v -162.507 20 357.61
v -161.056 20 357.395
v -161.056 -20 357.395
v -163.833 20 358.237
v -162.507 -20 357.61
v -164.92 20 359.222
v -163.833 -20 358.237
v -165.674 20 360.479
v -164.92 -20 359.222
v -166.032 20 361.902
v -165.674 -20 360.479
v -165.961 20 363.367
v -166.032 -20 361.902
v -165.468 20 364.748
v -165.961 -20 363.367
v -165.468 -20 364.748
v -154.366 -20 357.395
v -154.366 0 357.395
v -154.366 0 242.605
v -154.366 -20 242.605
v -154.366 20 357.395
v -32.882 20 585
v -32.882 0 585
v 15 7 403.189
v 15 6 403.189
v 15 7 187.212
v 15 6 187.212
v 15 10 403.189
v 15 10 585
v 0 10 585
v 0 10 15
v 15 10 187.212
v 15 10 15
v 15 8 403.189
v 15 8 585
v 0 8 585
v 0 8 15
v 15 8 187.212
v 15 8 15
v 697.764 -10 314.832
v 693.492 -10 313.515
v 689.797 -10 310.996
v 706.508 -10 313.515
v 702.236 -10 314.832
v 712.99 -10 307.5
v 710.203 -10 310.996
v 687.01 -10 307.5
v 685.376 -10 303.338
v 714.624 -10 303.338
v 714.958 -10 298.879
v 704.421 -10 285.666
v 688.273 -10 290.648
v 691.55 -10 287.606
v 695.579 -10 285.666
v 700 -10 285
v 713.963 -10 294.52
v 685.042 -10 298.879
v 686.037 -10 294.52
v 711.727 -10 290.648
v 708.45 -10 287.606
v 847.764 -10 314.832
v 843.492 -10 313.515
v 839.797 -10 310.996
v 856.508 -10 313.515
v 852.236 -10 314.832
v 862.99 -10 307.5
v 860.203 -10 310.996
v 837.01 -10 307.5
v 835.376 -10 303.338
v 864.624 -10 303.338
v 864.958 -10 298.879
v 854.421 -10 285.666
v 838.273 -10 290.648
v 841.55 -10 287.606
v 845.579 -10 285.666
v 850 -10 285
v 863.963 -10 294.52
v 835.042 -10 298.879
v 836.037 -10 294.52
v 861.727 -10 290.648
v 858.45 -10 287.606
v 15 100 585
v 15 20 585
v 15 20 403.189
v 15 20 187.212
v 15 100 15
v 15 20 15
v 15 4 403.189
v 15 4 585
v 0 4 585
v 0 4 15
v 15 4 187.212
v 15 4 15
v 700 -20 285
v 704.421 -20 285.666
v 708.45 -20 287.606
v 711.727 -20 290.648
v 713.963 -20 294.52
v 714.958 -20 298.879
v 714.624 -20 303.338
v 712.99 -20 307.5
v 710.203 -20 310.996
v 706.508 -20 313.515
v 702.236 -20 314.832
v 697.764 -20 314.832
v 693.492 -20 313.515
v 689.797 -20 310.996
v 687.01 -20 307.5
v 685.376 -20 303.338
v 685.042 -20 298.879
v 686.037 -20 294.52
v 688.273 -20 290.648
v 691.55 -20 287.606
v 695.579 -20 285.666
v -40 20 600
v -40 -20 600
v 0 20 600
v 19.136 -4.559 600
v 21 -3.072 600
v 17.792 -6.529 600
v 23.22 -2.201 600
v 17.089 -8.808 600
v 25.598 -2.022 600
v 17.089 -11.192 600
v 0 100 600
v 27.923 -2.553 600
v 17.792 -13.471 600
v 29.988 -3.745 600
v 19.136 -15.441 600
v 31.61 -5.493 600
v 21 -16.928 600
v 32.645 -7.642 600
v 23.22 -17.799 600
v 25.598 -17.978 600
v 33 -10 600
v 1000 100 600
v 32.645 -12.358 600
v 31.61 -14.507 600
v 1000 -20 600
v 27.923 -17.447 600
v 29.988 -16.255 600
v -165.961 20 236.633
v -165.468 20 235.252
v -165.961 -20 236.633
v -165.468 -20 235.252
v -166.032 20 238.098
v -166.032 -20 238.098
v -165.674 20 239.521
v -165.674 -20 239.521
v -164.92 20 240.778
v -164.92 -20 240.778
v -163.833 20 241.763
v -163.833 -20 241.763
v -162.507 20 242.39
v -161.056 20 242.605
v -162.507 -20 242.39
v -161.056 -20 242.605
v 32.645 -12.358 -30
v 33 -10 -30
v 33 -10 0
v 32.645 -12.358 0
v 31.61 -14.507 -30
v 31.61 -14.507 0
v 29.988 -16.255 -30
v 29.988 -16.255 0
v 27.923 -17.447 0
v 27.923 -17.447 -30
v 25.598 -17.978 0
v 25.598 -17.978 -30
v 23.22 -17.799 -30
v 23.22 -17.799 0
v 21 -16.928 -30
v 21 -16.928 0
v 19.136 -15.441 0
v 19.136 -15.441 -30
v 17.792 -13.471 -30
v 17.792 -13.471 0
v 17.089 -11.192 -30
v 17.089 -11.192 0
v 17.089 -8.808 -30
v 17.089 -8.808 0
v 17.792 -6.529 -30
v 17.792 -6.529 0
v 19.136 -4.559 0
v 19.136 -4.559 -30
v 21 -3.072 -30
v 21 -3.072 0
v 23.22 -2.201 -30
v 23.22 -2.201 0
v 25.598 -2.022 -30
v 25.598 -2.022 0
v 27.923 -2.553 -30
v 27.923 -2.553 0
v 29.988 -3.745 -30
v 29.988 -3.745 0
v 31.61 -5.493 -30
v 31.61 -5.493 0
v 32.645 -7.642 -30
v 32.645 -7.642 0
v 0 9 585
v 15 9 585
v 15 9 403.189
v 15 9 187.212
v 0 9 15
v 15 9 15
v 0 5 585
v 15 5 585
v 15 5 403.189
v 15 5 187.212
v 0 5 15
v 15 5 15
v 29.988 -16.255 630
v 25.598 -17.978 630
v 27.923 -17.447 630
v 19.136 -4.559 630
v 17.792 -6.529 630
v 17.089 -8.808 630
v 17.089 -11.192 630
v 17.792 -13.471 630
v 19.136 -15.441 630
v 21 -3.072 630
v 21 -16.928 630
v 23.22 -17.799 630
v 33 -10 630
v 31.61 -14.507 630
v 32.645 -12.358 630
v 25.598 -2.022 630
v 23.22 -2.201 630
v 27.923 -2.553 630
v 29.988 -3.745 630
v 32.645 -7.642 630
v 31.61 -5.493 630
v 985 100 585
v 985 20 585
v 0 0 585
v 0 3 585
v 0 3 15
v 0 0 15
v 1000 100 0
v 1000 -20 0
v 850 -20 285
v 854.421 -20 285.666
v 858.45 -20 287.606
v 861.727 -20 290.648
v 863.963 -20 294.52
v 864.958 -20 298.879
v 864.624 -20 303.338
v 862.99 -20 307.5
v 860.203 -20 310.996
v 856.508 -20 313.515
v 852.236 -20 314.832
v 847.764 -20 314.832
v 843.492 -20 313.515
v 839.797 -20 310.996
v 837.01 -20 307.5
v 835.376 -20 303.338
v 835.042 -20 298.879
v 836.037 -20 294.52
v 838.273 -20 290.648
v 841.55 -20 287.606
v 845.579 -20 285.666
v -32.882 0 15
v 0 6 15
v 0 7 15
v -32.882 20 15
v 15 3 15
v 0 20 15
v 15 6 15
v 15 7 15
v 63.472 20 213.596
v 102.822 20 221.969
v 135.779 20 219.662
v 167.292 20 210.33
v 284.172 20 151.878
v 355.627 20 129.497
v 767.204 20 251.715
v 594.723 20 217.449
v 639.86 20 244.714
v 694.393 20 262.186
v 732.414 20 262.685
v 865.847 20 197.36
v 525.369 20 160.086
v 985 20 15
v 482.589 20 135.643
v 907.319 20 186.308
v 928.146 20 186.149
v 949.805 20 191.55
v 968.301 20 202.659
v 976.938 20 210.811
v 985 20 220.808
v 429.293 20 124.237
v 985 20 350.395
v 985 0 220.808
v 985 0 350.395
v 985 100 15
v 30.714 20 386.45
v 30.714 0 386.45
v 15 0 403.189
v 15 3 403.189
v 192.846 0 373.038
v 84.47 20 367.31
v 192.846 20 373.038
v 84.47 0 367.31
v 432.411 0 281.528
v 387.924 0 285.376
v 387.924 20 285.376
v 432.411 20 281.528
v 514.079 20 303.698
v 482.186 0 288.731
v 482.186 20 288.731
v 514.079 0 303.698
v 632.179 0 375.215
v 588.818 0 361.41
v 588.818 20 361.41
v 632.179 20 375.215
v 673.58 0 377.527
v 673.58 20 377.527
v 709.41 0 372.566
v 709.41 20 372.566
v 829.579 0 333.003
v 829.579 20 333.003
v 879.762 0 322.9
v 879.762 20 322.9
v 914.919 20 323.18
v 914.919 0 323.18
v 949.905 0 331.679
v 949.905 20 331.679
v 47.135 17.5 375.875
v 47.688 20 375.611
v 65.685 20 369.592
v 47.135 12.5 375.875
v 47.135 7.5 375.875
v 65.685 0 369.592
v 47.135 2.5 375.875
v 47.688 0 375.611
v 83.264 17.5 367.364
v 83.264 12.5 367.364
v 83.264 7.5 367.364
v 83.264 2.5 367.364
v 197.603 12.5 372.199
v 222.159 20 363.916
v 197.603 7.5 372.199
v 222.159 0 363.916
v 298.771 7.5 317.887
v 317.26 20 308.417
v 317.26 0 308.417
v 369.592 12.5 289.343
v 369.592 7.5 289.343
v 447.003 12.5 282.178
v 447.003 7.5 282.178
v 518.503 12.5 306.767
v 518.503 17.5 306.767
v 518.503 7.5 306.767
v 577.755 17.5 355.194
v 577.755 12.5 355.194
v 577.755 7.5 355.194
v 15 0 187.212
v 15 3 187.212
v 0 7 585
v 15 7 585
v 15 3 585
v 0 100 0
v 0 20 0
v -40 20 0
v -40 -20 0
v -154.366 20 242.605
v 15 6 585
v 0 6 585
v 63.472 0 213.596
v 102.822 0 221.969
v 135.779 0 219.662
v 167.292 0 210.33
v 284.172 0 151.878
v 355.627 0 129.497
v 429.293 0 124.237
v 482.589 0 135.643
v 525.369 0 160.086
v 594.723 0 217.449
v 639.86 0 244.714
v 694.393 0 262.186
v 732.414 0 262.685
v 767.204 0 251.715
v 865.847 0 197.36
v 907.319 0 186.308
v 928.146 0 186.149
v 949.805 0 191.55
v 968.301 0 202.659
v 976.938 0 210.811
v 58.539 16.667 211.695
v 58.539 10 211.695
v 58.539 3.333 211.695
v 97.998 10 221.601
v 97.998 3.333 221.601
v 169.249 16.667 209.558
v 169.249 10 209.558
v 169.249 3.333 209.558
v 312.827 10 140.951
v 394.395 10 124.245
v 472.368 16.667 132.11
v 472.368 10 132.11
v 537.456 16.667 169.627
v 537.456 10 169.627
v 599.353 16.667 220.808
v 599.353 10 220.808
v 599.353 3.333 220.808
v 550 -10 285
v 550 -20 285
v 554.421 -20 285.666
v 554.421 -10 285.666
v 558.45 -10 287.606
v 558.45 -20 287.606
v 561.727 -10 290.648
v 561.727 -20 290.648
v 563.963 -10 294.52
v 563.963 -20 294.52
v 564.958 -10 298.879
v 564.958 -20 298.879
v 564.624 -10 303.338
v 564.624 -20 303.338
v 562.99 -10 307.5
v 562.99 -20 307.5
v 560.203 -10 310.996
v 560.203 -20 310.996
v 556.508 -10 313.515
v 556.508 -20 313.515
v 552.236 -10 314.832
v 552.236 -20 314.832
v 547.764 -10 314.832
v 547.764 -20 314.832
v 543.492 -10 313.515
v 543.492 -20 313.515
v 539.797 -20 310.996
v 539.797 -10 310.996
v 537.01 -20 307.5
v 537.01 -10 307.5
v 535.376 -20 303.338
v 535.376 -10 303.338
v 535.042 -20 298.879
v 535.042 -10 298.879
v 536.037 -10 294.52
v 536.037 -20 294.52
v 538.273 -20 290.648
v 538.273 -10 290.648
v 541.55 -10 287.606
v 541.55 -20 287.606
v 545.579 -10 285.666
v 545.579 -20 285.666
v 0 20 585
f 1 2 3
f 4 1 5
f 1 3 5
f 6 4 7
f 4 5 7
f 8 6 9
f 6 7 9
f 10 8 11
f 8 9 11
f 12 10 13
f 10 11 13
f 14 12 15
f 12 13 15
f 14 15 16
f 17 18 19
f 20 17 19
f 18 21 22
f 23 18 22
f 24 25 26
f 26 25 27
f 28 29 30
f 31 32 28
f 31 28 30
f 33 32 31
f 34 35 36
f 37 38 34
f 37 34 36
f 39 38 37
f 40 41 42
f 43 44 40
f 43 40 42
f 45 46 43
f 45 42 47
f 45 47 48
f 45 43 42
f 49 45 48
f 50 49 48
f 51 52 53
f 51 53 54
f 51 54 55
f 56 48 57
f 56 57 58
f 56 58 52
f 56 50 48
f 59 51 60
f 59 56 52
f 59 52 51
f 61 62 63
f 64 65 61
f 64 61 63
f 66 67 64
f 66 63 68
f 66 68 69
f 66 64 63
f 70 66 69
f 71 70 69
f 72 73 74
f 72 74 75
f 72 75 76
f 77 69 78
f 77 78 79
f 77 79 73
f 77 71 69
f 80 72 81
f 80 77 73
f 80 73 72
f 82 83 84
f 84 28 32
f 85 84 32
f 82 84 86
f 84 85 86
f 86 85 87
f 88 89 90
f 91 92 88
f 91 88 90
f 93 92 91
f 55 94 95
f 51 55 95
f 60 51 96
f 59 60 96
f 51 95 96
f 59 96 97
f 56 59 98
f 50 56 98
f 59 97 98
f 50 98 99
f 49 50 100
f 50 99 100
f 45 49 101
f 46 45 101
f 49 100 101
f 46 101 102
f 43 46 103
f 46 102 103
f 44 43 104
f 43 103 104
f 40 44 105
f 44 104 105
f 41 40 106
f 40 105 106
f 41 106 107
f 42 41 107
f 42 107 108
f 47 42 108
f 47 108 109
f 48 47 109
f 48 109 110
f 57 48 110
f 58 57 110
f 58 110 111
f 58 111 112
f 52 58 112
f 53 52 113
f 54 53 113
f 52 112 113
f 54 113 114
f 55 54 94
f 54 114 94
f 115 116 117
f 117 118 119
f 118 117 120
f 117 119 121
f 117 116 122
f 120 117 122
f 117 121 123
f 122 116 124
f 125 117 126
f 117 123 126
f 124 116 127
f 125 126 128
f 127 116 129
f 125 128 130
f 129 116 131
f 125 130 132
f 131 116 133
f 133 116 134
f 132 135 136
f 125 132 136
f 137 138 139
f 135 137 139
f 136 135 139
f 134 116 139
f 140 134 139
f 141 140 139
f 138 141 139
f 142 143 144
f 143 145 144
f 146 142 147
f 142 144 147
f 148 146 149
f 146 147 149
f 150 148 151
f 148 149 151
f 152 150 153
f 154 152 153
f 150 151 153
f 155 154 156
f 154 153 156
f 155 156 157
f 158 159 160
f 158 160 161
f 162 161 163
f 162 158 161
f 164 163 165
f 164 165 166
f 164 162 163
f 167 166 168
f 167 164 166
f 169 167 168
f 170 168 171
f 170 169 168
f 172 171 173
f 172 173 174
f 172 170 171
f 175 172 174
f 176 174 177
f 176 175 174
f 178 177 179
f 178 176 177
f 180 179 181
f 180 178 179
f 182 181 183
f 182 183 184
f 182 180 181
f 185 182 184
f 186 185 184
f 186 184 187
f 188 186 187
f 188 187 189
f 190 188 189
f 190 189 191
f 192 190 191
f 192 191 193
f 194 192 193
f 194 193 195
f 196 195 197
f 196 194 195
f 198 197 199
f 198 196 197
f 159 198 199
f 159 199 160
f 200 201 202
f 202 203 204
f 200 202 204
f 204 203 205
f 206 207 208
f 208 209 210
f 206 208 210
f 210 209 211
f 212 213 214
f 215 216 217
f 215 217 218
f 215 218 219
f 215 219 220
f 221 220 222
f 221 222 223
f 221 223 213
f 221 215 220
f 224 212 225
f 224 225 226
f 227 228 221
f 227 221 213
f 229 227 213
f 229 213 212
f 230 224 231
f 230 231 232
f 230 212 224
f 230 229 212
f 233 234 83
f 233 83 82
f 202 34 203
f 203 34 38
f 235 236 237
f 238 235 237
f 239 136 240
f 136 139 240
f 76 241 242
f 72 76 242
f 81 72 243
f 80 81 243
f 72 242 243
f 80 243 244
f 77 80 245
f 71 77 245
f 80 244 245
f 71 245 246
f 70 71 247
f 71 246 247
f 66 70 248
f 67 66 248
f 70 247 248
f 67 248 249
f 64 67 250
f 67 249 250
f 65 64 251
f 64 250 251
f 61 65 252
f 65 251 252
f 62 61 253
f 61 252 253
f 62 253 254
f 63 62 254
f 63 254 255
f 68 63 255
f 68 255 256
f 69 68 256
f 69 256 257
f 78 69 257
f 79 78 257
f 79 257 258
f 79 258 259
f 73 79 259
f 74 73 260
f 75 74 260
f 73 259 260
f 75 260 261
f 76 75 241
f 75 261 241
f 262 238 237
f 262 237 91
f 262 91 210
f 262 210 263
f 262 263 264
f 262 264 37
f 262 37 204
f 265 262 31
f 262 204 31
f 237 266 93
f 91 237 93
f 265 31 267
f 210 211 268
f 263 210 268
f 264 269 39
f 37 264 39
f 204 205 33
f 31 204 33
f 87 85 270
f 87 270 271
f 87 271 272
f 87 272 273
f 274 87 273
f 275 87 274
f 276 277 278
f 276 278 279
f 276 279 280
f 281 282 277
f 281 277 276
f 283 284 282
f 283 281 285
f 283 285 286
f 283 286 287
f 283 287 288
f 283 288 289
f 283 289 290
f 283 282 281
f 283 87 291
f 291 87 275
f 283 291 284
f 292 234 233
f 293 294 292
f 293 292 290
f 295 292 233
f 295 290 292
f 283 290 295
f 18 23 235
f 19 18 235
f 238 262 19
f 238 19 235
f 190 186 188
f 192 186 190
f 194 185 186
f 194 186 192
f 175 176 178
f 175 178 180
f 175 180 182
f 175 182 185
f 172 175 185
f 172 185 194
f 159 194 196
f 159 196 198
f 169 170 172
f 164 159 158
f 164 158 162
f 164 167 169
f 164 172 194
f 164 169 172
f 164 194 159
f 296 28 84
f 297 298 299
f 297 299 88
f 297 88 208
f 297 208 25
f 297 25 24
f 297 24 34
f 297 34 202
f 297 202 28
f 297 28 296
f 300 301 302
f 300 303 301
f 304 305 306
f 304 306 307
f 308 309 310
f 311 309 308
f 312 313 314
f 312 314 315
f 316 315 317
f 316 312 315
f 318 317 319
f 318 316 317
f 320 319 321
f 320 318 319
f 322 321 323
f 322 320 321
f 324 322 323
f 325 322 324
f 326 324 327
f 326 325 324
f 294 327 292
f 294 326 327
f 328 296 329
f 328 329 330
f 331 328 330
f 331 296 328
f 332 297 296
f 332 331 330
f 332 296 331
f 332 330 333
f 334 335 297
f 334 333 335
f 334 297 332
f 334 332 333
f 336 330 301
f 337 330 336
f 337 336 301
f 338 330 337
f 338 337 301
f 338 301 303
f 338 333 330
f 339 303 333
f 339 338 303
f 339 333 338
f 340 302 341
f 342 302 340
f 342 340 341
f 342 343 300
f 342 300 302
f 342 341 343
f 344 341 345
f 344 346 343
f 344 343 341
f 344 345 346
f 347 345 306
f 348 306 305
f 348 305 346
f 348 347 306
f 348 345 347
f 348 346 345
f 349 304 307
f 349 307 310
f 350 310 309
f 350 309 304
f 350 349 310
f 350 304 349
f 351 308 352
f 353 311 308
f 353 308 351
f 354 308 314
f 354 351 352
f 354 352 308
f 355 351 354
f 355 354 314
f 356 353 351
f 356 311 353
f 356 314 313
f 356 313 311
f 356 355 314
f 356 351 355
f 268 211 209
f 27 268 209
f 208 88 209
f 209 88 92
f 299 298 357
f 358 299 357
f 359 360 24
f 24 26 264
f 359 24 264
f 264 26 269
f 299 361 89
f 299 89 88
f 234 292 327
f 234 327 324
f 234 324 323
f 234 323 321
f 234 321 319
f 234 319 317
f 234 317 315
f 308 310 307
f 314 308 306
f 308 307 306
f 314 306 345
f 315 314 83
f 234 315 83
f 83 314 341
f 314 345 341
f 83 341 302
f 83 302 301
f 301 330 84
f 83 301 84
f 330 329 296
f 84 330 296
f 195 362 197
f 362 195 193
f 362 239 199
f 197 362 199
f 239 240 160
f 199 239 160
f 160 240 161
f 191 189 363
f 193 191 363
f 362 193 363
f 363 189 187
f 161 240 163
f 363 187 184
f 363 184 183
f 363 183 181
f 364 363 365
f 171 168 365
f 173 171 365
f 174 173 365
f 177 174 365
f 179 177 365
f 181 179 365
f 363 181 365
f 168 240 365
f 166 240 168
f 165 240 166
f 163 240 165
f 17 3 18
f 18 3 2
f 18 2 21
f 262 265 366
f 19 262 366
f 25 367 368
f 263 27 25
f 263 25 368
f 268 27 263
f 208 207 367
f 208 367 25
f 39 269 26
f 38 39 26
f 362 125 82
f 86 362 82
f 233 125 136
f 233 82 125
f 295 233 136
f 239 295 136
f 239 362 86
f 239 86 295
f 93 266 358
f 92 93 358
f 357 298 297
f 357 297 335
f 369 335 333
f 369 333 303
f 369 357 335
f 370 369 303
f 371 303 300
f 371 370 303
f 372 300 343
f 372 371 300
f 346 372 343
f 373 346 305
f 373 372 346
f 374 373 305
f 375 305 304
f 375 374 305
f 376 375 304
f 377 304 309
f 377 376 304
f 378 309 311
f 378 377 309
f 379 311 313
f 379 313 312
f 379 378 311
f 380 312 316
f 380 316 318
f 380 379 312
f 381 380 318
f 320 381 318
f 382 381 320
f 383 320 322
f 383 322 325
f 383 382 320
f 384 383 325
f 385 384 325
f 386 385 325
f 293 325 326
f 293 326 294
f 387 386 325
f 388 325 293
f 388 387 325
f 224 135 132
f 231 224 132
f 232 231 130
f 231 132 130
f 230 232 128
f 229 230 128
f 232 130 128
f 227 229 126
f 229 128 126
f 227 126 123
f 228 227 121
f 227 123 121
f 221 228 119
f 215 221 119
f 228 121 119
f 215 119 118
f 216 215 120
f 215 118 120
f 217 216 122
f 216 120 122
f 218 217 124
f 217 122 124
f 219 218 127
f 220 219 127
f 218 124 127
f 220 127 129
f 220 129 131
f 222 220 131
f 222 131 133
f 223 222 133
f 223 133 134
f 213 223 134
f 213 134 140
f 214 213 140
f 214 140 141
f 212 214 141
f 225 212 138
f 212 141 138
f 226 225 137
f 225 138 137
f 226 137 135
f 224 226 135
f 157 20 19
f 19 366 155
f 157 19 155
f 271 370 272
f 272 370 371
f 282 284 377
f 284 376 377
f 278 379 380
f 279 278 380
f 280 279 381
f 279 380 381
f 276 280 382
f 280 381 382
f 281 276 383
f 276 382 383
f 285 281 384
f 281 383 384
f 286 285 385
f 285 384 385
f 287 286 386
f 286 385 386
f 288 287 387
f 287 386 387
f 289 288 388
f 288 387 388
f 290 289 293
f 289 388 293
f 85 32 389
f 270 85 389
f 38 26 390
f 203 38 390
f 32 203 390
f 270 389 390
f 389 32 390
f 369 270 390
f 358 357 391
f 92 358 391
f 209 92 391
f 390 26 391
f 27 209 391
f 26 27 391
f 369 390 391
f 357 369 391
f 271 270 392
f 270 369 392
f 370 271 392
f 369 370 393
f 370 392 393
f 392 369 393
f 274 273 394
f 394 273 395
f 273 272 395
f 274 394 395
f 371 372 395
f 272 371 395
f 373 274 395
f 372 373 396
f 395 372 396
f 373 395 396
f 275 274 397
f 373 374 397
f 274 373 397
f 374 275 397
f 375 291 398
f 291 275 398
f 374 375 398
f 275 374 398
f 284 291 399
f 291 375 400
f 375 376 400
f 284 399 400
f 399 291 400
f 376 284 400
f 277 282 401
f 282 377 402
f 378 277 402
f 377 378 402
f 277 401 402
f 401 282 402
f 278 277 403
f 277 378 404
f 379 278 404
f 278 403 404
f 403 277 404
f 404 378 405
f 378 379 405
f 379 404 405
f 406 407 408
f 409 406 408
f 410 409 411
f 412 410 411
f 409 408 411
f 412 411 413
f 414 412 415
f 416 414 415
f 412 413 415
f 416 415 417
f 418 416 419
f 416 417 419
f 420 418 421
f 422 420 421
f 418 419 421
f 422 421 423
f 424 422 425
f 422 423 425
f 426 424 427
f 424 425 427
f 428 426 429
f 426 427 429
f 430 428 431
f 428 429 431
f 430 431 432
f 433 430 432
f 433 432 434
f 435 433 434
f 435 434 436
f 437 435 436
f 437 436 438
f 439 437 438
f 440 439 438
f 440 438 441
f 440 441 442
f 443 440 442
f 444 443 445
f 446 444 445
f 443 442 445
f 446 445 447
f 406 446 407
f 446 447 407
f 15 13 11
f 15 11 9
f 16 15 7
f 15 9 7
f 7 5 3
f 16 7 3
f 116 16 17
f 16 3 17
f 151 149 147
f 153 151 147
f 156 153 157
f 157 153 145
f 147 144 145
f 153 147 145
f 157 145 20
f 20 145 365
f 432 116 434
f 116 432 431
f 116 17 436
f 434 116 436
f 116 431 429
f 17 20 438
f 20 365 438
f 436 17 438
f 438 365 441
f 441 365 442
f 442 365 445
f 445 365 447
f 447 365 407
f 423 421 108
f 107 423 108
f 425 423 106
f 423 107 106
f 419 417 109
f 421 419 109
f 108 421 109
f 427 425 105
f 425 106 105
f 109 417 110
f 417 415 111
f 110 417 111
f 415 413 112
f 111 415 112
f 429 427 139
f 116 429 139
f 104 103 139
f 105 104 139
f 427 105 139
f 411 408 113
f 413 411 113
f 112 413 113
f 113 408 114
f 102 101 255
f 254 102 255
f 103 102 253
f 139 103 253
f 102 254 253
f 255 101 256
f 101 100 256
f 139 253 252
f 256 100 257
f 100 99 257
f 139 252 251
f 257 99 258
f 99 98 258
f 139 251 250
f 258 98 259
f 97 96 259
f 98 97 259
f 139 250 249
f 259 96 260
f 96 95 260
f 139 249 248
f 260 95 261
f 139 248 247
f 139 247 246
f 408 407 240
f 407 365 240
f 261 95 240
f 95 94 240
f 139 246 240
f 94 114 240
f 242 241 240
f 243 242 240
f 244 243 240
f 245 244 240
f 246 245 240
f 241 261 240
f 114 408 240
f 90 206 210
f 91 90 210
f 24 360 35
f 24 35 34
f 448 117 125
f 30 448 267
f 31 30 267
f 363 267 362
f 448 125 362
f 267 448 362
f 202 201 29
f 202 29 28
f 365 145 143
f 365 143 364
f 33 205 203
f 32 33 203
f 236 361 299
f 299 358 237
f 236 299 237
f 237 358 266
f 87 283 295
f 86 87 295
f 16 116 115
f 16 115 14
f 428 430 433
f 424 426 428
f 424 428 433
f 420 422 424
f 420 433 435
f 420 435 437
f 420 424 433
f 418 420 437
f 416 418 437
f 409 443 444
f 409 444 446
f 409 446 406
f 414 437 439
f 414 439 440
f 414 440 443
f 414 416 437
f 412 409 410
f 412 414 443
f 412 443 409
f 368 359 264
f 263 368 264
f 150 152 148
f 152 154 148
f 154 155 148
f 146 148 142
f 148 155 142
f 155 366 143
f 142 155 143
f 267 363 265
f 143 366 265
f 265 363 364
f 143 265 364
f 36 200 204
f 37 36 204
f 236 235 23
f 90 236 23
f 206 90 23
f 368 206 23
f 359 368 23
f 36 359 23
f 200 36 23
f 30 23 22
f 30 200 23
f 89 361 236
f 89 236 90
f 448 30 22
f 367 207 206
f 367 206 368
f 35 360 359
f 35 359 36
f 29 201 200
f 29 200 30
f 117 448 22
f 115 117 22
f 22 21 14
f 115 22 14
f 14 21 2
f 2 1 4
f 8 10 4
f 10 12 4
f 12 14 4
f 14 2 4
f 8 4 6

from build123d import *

# Parameters (mm, degrees)
SKETCH1_W           = 1000
SKETCH1_H           = 600
BOSS_EXTRUDE1_DEPTH = 20
SKETCH4_W           = 970
SKETCH4_H           = 570
BOSS_EXTRUDE3_DEPTH = 100
SKETCH5_W           = 570
SKETCH5_H           = 1
CUT_EXTRUDE4_DEPTH  = 100
SKETCH9_W           = 40
SKETCH9_H           = 300
BOSS_EXTRUDE4_DEPTH = 40
CUT_EXTRUDE5_DEPTH  = 20
CUT_EXTRUDE8_DEPTH  = 40
FILLET1_R           = 5
SKETCH13_R          = 15
CUT_EXTRUDE10_DEPTH = 10
SKETCH2_R           = 8
BOSS_EXTRUDE5_DEPTH = 30
BOSS_EXTRUDE6_START = 30
SKETCH3_R           = 8
BOSS_EXTRUDE6_DEPTH = 30
BOSS_EXTRUDE8_DEPTH = 20


with BuildPart() as part:
    # Sketch1 → Boss-Extrude1 (new body)
    with BuildSketch(Plane(origin=(0, 0, 0), x_dir=(1, 0, 0), z_dir=(0, 1, 0))):
        with Locations((500, -300)):
            Rectangle(SKETCH1_W, SKETCH1_H)
    extrude(amount=-BOSS_EXTRUDE1_DEPTH)

    # Sketch4 → Boss-Extrude3 (add)
    with BuildSketch(Plane(origin=(0, 0, 0), x_dir=(1, 0, 0), z_dir=(0, 1, 0))):
        Polygon((985, 0), (0, 0), (0, -600), (1000, -600), (1000, 0), align=None)
        with Locations((500, -300)):
            Rectangle(SKETCH4_W, SKETCH4_H, mode=Mode.SUBTRACT)
    extrude(amount=BOSS_EXTRUDE3_DEPTH)

    # Sketch5 → Cut-Extrude4 (cut)
    with BuildSketch(Plane(origin=(15, 0, 0), x_dir=(0, 0, -1), z_dir=(1, 0, 0))):
        with Locations((-300, 3.5)):
            Rectangle(SKETCH5_W, SKETCH5_H)
        with Locations((-300, 5.5)):
            Rectangle(SKETCH5_W, SKETCH5_H)
        with Locations((-300, 7.5)):
            Rectangle(SKETCH5_W, SKETCH5_H)
        with Locations((-300, 9.5)):
            Rectangle(SKETCH5_W, SKETCH5_H)
    extrude(amount=-CUT_EXTRUDE4_DEPTH, mode=Mode.SUBTRACT)

    # Sketch9 → Boss-Extrude4 (add)
    with BuildSketch(Plane(origin=(0, -20, 0), x_dir=(-1, 0, 0), z_dir=(0, -1, 0))):
        with Locations((20, -150)):
            Rectangle(SKETCH9_W, SKETCH9_H)
        with Locations((20, -450)):
            Rectangle(SKETCH9_W, SKETCH9_H)
        Polygon((40, -300), (40, -600), (200, -300), align=None)
        Polygon((40, 0), (40, -300), (200, -300), align=None)
    extrude(amount=-BOSS_EXTRUDE4_DEPTH)

    # Sketch10 → Cut-Extrude5 (cut)
    with BuildSketch(Plane(origin=(0, 20, 0), x_dir=(1, 0, 0), z_dir=(0, 1, 0))):
        Polygon((-32.882131169, -15), (-185, -300), (-32.882131169, -585), (0, -585), (0, -15), align=None)
    extrude(amount=-CUT_EXTRUDE5_DEPTH, mode=Mode.SUBTRACT)

    # Sketch12 → Cut-Extrude8 (cut)
    with BuildSketch(Plane(origin=(0, 20, 0), x_dir=(1, 0, 0), z_dir=(0, 1, 0))):
        Polygon((-154.365546922, -300), (-154.365546922, -242.604907667), (-169.389284089, -242.604907667), (-200, -300), (-169.389284089, -357.395092333), (-154.365546922, -357.395092333), align=None)
    extrude(amount=-CUT_EXTRUDE8_DEPTH, mode=Mode.SUBTRACT)

    # Fillet1
    fillet1_edges = [part.edges().sort_by_distance(p)[0] for p in [
        (-169.389284089, 0, 357.395092333),
        (-169.389284089, 0, 242.604907667),
    ]]
    fillet(fillet1_edges, radius=FILLET1_R)

    # Sketch13 → Cut-Extrude10 (cut)
    with BuildSketch(Plane(origin=(0, -20, 0), x_dir=(-1, 0, 0), z_dir=(0, -1, 0))):
        with Locations(Location((-700, -300, 0), (0, 0, 90))):
            Circle(SKETCH13_R)
        with Locations(Location((-850, -300, 0), (0, 0, 90))):
            Circle(SKETCH13_R)
        with Locations(Location((-550, -300, 0), (0, 0, 90))):
            Circle(SKETCH13_R)
    extrude(amount=-CUT_EXTRUDE10_DEPTH, mode=Mode.SUBTRACT)

    # Sketch2 → Boss-Extrude5 (add)
    with BuildSketch(Plane.XY.offset(600)):
        with Locations((25, -10)):
            Circle(SKETCH2_R)
    extrude(amount=BOSS_EXTRUDE5_DEPTH)

    # Sketch3 → Boss-Extrude6 (add)
    with BuildSketch(Plane(origin=(0, 0, 0), x_dir=(-1, 0, 0), z_dir=(0, 0, -1)).offset(BOSS_EXTRUDE6_START)):
        with Locations(Location((-25, -10, 0), (0, 0, 180))):
            Circle(SKETCH3_R)
    extrude(amount=-BOSS_EXTRUDE6_DEPTH)

    # Sketch14 → Boss-Extrude8 (add)
    with BuildSketch(Plane(origin=(0, 0, 0), x_dir=(1, 0, 0), z_dir=(0, 1, 0))):
        with BuildLine():
            Line((985, -220.808334487), (985, -15))
            Line((985, -15), (15, -15))
            Line((15, -15), (15, -187.21187033))
            add(Edge.make_bspline(
                [(15, -187.21187033), (124.719890795, -265.420288021), (239.941554954, -138.330767199), (485.474739291, -103.562224537), (593.939880912, -232.151341364), (733.720800914, -286.492070141), (845.878875539, -194.569242684), (947.375015923, -167.628315857), (985, -220.808334487)],
                knots=[0, 0, 0, 0, 0.268883391, 0.47609509, 0.600698085, 0.739638126, 0.845533083, 1, 1, 1, 1], degree=3))
        make_face()
        with BuildLine():
            Line((985, -350.394696236), (985, -585))
            Line((985, -585), (15, -585))
            Line((15, -585), (15, -403.189139911))
            add(Edge.make_bspline(
                [(15, -403.189139911), (64.499324983, -337.050425789), (173.991359683, -407.882670131), (289.800754445, -316.886525176), (391.178087844, -274.810977377), (510.180148048, -285.042641922), (576.080536092, -369.34637534), (690.491991673, -387.162809592), (819.400344159, -331.202995168), (921.945239203, -306.403251299), (985, -350.394696236)],
                knots=[0, 0, 0, 0, 0.186364679, 0.276053057, 0.40293442, 0.506803328, 0.593094347, 0.697797138, 0.814364056, 1, 1, 1, 1], degree=3))
        make_face()
    extrude(amount=BOSS_EXTRUDE8_DEPTH)


solid = part.part
